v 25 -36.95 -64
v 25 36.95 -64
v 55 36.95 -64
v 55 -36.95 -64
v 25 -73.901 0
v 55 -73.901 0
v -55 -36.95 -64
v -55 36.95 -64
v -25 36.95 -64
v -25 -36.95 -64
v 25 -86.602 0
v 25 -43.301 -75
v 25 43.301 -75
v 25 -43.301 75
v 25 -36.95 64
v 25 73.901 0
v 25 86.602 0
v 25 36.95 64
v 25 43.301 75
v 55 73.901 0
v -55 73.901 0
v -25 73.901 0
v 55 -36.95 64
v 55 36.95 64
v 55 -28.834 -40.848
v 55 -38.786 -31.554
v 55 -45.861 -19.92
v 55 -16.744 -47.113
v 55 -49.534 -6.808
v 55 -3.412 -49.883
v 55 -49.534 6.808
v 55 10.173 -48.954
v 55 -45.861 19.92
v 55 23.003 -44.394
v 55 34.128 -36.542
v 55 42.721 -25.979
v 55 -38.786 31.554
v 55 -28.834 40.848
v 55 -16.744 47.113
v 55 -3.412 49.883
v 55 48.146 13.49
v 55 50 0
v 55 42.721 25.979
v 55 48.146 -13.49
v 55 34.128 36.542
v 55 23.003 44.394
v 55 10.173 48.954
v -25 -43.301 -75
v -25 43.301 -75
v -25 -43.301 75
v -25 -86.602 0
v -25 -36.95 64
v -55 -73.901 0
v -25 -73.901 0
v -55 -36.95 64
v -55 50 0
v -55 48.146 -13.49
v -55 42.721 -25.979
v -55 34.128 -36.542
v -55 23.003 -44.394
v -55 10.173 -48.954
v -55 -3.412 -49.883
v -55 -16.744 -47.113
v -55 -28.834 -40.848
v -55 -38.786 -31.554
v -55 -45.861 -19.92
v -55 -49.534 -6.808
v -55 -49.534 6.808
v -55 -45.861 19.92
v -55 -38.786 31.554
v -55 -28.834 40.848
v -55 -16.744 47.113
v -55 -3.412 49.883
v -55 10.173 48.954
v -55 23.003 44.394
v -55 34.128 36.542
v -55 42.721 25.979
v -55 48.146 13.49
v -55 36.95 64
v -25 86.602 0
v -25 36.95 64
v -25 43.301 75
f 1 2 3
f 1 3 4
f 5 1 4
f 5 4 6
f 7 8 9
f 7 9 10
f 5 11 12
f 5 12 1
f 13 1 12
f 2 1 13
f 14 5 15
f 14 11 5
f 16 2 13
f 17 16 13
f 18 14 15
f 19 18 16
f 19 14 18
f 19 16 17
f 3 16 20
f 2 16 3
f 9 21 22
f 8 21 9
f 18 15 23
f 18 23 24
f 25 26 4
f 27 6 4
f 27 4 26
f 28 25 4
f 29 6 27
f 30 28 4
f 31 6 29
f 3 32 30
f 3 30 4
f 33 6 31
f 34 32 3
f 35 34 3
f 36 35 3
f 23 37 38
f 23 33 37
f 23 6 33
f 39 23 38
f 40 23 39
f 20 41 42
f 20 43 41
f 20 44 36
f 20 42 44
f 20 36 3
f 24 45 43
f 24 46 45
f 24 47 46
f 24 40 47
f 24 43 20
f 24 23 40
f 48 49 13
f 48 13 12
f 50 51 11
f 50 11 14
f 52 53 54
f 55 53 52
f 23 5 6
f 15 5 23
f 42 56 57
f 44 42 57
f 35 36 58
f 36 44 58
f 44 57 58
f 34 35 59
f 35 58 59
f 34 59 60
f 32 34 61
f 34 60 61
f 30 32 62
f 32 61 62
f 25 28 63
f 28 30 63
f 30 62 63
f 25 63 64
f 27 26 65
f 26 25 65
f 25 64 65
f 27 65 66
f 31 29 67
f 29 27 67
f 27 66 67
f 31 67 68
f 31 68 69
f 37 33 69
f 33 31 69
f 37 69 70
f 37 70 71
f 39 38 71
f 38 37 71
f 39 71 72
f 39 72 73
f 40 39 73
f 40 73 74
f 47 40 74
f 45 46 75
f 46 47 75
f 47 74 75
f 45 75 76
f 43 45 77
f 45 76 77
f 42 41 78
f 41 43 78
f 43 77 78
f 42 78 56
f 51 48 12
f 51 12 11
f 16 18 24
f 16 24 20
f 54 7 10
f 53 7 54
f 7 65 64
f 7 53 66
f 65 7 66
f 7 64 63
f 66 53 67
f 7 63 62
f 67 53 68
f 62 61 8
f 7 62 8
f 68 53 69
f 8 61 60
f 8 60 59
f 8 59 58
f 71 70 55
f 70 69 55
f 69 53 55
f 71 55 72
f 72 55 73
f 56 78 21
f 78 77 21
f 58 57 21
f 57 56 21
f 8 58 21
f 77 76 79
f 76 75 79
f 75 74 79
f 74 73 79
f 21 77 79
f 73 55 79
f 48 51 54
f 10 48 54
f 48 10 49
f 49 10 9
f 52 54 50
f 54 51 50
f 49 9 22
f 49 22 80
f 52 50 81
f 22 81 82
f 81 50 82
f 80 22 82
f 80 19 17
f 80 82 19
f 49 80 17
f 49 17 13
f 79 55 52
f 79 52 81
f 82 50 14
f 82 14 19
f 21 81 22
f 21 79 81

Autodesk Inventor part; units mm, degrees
ref_plane "YZ Plane" through (0, 0, 0) normal (1, 0, 0) x (0, 1, 0)
ref_plane "XZ Plane" through (0, 0, 0) normal (0, 1, 0) x (-1, 0, 0)
ref_plane "XY Plane" through (0, 0, 0) normal (0, 0, 1) x (1, 0, 0)
sketch "Sketch1" plane through (0, 0, 0) normal (1, 0, 0) x (0, 1, 0)
  circle A0 centre (0, 0) radius 50
  line L0 (-36.9504, -64) -> (-73.9008, 0)
  line L1 (-73.9008, 0) -> (-36.9504, 64)
  line L2 (-36.9504, 64) -> (36.9504, 64)
  line L3 (36.9504, 64) -> (73.9008, 0)
  line L4 (73.9008, 0) -> (36.9504, -64)
  line L5 (36.9504, -64) -> (-36.9504, -64)
  dimension "d0" = 100
  dimension "d1" = 64
extrude "Extrusion1" add sketch "Sketch1" along normal mid plane 110
sketch "Sketch3" plane through (0, 0, 0) normal (1, 0, 0) x (0, 1, 0)
  line L0 (-43.3013, -75) -> (-86.6025, 0)
  line L1 (-86.6025, 0) -> (-43.3013, 75)
  line L2 (-43.3013, 75) -> (43.3013, 75)
  line L3 (43.3013, 75) -> (86.6025, 0)
  line L4 (86.6025, 0) -> (43.3013, -75)
  line L5 (43.3013, -75) -> (-43.3013, -75)
  circle A0 centre (0, 0) radius 50 projected
  dimension "d4" = 75
extrude "Extrusion2" add sketch "Sketch3" along normal mid plane 50
thread "Thread1" size "M100x6" class "6H" standard "ANSI Metric M Profile" full length
properties part number "uniao assento conico 4 inch"
